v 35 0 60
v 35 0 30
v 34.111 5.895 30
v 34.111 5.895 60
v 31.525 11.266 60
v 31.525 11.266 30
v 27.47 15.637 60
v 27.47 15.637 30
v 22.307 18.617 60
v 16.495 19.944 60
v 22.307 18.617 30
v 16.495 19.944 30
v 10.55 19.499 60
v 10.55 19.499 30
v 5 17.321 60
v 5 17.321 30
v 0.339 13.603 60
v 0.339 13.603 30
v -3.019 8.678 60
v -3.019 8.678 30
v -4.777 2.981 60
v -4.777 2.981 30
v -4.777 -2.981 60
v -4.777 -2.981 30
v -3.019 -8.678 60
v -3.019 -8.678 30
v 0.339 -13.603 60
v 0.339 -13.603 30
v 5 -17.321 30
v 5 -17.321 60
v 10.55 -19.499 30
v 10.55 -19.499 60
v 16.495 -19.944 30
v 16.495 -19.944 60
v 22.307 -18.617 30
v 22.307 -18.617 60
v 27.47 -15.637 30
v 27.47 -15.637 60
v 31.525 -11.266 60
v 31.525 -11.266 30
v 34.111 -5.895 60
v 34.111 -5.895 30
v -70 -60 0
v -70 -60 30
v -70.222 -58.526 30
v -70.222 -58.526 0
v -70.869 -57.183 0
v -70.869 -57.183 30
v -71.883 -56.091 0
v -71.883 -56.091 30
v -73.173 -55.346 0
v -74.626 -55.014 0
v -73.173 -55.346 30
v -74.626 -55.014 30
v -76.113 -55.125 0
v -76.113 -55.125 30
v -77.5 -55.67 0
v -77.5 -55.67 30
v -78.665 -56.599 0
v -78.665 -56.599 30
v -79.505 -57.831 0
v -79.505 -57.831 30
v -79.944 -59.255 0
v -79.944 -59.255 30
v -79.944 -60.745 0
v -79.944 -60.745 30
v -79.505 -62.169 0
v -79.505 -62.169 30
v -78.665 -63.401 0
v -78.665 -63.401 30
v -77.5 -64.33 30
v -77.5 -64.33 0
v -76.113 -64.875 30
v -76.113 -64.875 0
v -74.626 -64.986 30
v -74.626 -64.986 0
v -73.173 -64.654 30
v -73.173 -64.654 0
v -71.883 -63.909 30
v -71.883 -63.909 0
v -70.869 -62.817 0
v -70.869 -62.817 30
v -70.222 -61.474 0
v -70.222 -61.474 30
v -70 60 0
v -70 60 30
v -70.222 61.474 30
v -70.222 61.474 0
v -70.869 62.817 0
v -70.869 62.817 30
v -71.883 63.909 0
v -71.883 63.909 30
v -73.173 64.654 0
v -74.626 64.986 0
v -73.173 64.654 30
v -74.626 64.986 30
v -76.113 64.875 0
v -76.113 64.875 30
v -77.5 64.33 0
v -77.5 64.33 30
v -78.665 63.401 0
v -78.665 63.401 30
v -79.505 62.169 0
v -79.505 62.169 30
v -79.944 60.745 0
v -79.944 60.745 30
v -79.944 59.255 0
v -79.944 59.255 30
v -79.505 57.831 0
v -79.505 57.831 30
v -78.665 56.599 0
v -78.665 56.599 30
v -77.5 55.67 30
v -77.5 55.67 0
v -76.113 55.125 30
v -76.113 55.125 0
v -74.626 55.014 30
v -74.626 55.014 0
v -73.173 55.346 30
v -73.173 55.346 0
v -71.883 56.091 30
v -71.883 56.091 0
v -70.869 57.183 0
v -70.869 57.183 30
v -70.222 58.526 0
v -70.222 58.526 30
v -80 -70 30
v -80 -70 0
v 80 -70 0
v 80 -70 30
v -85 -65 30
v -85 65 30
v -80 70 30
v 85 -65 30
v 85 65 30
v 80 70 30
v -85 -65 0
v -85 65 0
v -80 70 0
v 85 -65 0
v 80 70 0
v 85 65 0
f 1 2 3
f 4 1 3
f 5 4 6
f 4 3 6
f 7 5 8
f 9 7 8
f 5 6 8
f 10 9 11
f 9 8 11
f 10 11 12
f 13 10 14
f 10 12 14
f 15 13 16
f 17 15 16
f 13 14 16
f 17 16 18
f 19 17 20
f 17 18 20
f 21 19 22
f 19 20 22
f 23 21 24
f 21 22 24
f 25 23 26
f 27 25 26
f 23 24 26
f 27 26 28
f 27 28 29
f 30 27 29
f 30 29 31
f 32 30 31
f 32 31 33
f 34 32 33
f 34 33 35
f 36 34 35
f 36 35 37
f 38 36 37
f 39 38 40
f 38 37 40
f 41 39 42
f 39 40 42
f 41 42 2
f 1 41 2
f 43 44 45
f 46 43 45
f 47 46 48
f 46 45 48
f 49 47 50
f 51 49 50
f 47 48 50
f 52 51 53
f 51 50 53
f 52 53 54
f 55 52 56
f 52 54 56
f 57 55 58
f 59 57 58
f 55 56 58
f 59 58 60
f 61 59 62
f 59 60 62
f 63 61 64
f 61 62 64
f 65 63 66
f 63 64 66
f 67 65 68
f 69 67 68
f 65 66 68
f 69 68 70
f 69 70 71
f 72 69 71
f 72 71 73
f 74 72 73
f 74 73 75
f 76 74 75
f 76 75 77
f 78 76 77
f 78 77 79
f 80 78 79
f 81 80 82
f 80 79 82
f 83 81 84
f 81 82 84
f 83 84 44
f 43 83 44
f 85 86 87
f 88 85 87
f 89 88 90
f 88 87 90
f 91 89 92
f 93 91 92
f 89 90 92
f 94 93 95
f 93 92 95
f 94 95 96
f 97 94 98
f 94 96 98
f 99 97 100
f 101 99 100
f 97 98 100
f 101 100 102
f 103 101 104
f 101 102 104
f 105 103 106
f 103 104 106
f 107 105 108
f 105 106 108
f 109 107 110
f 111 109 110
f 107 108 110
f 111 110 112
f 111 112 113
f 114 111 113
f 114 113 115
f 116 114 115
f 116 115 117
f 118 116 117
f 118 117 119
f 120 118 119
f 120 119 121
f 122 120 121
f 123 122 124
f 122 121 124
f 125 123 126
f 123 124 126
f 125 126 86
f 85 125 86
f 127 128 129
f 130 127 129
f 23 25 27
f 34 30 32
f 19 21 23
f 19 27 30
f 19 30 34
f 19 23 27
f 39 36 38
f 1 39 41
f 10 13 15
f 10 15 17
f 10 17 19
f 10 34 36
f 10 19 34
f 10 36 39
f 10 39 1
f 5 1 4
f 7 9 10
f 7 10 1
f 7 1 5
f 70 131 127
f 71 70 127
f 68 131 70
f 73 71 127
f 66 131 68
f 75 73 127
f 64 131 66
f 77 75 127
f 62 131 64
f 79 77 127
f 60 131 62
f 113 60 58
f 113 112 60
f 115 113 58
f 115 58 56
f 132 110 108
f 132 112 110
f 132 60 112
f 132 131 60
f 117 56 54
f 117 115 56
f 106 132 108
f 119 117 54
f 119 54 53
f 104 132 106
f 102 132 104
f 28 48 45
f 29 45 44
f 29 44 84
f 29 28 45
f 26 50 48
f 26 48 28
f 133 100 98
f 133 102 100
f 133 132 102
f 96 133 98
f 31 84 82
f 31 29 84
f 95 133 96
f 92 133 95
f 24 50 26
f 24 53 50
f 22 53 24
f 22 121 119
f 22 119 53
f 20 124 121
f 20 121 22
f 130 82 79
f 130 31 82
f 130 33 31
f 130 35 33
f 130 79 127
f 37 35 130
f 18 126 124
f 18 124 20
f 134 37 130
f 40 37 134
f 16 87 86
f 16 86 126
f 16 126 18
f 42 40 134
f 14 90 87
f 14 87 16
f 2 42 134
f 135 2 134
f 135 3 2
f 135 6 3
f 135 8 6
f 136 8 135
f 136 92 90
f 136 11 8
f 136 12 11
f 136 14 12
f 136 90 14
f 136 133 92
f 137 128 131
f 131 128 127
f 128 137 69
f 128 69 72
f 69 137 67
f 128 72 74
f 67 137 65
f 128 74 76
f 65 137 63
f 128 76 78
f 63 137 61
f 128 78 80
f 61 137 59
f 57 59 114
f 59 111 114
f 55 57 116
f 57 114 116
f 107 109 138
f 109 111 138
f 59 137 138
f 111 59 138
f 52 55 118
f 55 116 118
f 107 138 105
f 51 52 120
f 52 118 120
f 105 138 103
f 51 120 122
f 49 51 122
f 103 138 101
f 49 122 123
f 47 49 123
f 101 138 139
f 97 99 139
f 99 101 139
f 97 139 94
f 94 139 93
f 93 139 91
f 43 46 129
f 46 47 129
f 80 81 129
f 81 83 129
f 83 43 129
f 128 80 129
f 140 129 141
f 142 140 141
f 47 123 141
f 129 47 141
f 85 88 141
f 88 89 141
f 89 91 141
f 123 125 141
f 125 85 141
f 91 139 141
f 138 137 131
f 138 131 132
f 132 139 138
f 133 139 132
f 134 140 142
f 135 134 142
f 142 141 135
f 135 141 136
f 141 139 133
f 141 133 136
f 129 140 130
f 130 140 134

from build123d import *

# Parameters (mm, degrees)
CROQUIS1_W              = 170
CROQUIS1_H              = 140
SALIENTE_EXTRUIR1_DEPTH = 30
CHAFL_N1_SIZE           = 5
CROQUIS2_R              = 20
SALIENTE_EXTRUIR2_DEPTH = 30
CROQUIS2_3_R            = 5
CORTAR_EXTRUIR1_DEPTH   = 30


with BuildPart() as part:
    # Croquis1 → Saliente-Extruir1 (new body)
    with BuildSketch(Plane.XY):
        Rectangle(CROQUIS1_W, CROQUIS1_H)
    extrude(amount=SALIENTE_EXTRUIR1_DEPTH)

    # Chaflán1
    chafl_n1_edges = [part.edges().sort_by_distance(p)[0] for p in [
        (85, -70, 15),
        (-85, -70, 15),
        (-85, 70, 15),
        (85, 70, 15),
    ]]
    chamfer(chafl_n1_edges, length=CHAFL_N1_SIZE)

    # Croquis2 → Saliente-Extruir2 (add)
    with BuildSketch(Plane.XY.offset(30)):
        with Locations((15, 0)):
            Circle(CROQUIS2_R)
    extrude(amount=SALIENTE_EXTRUIR2_DEPTH)

    # Croquis2<3> → Cortar-Extruir1 (cut)
    with BuildSketch(Plane.XY.offset(30)):
        with Locations((-75, 60)):
            Circle(CROQUIS2_3_R)
        with Locations((-75, -60)):
            Circle(CROQUIS2_3_R)
    extrude(amount=-CORTAR_EXTRUIR1_DEPTH, mode=Mode.SUBTRACT)


solid = part.part
